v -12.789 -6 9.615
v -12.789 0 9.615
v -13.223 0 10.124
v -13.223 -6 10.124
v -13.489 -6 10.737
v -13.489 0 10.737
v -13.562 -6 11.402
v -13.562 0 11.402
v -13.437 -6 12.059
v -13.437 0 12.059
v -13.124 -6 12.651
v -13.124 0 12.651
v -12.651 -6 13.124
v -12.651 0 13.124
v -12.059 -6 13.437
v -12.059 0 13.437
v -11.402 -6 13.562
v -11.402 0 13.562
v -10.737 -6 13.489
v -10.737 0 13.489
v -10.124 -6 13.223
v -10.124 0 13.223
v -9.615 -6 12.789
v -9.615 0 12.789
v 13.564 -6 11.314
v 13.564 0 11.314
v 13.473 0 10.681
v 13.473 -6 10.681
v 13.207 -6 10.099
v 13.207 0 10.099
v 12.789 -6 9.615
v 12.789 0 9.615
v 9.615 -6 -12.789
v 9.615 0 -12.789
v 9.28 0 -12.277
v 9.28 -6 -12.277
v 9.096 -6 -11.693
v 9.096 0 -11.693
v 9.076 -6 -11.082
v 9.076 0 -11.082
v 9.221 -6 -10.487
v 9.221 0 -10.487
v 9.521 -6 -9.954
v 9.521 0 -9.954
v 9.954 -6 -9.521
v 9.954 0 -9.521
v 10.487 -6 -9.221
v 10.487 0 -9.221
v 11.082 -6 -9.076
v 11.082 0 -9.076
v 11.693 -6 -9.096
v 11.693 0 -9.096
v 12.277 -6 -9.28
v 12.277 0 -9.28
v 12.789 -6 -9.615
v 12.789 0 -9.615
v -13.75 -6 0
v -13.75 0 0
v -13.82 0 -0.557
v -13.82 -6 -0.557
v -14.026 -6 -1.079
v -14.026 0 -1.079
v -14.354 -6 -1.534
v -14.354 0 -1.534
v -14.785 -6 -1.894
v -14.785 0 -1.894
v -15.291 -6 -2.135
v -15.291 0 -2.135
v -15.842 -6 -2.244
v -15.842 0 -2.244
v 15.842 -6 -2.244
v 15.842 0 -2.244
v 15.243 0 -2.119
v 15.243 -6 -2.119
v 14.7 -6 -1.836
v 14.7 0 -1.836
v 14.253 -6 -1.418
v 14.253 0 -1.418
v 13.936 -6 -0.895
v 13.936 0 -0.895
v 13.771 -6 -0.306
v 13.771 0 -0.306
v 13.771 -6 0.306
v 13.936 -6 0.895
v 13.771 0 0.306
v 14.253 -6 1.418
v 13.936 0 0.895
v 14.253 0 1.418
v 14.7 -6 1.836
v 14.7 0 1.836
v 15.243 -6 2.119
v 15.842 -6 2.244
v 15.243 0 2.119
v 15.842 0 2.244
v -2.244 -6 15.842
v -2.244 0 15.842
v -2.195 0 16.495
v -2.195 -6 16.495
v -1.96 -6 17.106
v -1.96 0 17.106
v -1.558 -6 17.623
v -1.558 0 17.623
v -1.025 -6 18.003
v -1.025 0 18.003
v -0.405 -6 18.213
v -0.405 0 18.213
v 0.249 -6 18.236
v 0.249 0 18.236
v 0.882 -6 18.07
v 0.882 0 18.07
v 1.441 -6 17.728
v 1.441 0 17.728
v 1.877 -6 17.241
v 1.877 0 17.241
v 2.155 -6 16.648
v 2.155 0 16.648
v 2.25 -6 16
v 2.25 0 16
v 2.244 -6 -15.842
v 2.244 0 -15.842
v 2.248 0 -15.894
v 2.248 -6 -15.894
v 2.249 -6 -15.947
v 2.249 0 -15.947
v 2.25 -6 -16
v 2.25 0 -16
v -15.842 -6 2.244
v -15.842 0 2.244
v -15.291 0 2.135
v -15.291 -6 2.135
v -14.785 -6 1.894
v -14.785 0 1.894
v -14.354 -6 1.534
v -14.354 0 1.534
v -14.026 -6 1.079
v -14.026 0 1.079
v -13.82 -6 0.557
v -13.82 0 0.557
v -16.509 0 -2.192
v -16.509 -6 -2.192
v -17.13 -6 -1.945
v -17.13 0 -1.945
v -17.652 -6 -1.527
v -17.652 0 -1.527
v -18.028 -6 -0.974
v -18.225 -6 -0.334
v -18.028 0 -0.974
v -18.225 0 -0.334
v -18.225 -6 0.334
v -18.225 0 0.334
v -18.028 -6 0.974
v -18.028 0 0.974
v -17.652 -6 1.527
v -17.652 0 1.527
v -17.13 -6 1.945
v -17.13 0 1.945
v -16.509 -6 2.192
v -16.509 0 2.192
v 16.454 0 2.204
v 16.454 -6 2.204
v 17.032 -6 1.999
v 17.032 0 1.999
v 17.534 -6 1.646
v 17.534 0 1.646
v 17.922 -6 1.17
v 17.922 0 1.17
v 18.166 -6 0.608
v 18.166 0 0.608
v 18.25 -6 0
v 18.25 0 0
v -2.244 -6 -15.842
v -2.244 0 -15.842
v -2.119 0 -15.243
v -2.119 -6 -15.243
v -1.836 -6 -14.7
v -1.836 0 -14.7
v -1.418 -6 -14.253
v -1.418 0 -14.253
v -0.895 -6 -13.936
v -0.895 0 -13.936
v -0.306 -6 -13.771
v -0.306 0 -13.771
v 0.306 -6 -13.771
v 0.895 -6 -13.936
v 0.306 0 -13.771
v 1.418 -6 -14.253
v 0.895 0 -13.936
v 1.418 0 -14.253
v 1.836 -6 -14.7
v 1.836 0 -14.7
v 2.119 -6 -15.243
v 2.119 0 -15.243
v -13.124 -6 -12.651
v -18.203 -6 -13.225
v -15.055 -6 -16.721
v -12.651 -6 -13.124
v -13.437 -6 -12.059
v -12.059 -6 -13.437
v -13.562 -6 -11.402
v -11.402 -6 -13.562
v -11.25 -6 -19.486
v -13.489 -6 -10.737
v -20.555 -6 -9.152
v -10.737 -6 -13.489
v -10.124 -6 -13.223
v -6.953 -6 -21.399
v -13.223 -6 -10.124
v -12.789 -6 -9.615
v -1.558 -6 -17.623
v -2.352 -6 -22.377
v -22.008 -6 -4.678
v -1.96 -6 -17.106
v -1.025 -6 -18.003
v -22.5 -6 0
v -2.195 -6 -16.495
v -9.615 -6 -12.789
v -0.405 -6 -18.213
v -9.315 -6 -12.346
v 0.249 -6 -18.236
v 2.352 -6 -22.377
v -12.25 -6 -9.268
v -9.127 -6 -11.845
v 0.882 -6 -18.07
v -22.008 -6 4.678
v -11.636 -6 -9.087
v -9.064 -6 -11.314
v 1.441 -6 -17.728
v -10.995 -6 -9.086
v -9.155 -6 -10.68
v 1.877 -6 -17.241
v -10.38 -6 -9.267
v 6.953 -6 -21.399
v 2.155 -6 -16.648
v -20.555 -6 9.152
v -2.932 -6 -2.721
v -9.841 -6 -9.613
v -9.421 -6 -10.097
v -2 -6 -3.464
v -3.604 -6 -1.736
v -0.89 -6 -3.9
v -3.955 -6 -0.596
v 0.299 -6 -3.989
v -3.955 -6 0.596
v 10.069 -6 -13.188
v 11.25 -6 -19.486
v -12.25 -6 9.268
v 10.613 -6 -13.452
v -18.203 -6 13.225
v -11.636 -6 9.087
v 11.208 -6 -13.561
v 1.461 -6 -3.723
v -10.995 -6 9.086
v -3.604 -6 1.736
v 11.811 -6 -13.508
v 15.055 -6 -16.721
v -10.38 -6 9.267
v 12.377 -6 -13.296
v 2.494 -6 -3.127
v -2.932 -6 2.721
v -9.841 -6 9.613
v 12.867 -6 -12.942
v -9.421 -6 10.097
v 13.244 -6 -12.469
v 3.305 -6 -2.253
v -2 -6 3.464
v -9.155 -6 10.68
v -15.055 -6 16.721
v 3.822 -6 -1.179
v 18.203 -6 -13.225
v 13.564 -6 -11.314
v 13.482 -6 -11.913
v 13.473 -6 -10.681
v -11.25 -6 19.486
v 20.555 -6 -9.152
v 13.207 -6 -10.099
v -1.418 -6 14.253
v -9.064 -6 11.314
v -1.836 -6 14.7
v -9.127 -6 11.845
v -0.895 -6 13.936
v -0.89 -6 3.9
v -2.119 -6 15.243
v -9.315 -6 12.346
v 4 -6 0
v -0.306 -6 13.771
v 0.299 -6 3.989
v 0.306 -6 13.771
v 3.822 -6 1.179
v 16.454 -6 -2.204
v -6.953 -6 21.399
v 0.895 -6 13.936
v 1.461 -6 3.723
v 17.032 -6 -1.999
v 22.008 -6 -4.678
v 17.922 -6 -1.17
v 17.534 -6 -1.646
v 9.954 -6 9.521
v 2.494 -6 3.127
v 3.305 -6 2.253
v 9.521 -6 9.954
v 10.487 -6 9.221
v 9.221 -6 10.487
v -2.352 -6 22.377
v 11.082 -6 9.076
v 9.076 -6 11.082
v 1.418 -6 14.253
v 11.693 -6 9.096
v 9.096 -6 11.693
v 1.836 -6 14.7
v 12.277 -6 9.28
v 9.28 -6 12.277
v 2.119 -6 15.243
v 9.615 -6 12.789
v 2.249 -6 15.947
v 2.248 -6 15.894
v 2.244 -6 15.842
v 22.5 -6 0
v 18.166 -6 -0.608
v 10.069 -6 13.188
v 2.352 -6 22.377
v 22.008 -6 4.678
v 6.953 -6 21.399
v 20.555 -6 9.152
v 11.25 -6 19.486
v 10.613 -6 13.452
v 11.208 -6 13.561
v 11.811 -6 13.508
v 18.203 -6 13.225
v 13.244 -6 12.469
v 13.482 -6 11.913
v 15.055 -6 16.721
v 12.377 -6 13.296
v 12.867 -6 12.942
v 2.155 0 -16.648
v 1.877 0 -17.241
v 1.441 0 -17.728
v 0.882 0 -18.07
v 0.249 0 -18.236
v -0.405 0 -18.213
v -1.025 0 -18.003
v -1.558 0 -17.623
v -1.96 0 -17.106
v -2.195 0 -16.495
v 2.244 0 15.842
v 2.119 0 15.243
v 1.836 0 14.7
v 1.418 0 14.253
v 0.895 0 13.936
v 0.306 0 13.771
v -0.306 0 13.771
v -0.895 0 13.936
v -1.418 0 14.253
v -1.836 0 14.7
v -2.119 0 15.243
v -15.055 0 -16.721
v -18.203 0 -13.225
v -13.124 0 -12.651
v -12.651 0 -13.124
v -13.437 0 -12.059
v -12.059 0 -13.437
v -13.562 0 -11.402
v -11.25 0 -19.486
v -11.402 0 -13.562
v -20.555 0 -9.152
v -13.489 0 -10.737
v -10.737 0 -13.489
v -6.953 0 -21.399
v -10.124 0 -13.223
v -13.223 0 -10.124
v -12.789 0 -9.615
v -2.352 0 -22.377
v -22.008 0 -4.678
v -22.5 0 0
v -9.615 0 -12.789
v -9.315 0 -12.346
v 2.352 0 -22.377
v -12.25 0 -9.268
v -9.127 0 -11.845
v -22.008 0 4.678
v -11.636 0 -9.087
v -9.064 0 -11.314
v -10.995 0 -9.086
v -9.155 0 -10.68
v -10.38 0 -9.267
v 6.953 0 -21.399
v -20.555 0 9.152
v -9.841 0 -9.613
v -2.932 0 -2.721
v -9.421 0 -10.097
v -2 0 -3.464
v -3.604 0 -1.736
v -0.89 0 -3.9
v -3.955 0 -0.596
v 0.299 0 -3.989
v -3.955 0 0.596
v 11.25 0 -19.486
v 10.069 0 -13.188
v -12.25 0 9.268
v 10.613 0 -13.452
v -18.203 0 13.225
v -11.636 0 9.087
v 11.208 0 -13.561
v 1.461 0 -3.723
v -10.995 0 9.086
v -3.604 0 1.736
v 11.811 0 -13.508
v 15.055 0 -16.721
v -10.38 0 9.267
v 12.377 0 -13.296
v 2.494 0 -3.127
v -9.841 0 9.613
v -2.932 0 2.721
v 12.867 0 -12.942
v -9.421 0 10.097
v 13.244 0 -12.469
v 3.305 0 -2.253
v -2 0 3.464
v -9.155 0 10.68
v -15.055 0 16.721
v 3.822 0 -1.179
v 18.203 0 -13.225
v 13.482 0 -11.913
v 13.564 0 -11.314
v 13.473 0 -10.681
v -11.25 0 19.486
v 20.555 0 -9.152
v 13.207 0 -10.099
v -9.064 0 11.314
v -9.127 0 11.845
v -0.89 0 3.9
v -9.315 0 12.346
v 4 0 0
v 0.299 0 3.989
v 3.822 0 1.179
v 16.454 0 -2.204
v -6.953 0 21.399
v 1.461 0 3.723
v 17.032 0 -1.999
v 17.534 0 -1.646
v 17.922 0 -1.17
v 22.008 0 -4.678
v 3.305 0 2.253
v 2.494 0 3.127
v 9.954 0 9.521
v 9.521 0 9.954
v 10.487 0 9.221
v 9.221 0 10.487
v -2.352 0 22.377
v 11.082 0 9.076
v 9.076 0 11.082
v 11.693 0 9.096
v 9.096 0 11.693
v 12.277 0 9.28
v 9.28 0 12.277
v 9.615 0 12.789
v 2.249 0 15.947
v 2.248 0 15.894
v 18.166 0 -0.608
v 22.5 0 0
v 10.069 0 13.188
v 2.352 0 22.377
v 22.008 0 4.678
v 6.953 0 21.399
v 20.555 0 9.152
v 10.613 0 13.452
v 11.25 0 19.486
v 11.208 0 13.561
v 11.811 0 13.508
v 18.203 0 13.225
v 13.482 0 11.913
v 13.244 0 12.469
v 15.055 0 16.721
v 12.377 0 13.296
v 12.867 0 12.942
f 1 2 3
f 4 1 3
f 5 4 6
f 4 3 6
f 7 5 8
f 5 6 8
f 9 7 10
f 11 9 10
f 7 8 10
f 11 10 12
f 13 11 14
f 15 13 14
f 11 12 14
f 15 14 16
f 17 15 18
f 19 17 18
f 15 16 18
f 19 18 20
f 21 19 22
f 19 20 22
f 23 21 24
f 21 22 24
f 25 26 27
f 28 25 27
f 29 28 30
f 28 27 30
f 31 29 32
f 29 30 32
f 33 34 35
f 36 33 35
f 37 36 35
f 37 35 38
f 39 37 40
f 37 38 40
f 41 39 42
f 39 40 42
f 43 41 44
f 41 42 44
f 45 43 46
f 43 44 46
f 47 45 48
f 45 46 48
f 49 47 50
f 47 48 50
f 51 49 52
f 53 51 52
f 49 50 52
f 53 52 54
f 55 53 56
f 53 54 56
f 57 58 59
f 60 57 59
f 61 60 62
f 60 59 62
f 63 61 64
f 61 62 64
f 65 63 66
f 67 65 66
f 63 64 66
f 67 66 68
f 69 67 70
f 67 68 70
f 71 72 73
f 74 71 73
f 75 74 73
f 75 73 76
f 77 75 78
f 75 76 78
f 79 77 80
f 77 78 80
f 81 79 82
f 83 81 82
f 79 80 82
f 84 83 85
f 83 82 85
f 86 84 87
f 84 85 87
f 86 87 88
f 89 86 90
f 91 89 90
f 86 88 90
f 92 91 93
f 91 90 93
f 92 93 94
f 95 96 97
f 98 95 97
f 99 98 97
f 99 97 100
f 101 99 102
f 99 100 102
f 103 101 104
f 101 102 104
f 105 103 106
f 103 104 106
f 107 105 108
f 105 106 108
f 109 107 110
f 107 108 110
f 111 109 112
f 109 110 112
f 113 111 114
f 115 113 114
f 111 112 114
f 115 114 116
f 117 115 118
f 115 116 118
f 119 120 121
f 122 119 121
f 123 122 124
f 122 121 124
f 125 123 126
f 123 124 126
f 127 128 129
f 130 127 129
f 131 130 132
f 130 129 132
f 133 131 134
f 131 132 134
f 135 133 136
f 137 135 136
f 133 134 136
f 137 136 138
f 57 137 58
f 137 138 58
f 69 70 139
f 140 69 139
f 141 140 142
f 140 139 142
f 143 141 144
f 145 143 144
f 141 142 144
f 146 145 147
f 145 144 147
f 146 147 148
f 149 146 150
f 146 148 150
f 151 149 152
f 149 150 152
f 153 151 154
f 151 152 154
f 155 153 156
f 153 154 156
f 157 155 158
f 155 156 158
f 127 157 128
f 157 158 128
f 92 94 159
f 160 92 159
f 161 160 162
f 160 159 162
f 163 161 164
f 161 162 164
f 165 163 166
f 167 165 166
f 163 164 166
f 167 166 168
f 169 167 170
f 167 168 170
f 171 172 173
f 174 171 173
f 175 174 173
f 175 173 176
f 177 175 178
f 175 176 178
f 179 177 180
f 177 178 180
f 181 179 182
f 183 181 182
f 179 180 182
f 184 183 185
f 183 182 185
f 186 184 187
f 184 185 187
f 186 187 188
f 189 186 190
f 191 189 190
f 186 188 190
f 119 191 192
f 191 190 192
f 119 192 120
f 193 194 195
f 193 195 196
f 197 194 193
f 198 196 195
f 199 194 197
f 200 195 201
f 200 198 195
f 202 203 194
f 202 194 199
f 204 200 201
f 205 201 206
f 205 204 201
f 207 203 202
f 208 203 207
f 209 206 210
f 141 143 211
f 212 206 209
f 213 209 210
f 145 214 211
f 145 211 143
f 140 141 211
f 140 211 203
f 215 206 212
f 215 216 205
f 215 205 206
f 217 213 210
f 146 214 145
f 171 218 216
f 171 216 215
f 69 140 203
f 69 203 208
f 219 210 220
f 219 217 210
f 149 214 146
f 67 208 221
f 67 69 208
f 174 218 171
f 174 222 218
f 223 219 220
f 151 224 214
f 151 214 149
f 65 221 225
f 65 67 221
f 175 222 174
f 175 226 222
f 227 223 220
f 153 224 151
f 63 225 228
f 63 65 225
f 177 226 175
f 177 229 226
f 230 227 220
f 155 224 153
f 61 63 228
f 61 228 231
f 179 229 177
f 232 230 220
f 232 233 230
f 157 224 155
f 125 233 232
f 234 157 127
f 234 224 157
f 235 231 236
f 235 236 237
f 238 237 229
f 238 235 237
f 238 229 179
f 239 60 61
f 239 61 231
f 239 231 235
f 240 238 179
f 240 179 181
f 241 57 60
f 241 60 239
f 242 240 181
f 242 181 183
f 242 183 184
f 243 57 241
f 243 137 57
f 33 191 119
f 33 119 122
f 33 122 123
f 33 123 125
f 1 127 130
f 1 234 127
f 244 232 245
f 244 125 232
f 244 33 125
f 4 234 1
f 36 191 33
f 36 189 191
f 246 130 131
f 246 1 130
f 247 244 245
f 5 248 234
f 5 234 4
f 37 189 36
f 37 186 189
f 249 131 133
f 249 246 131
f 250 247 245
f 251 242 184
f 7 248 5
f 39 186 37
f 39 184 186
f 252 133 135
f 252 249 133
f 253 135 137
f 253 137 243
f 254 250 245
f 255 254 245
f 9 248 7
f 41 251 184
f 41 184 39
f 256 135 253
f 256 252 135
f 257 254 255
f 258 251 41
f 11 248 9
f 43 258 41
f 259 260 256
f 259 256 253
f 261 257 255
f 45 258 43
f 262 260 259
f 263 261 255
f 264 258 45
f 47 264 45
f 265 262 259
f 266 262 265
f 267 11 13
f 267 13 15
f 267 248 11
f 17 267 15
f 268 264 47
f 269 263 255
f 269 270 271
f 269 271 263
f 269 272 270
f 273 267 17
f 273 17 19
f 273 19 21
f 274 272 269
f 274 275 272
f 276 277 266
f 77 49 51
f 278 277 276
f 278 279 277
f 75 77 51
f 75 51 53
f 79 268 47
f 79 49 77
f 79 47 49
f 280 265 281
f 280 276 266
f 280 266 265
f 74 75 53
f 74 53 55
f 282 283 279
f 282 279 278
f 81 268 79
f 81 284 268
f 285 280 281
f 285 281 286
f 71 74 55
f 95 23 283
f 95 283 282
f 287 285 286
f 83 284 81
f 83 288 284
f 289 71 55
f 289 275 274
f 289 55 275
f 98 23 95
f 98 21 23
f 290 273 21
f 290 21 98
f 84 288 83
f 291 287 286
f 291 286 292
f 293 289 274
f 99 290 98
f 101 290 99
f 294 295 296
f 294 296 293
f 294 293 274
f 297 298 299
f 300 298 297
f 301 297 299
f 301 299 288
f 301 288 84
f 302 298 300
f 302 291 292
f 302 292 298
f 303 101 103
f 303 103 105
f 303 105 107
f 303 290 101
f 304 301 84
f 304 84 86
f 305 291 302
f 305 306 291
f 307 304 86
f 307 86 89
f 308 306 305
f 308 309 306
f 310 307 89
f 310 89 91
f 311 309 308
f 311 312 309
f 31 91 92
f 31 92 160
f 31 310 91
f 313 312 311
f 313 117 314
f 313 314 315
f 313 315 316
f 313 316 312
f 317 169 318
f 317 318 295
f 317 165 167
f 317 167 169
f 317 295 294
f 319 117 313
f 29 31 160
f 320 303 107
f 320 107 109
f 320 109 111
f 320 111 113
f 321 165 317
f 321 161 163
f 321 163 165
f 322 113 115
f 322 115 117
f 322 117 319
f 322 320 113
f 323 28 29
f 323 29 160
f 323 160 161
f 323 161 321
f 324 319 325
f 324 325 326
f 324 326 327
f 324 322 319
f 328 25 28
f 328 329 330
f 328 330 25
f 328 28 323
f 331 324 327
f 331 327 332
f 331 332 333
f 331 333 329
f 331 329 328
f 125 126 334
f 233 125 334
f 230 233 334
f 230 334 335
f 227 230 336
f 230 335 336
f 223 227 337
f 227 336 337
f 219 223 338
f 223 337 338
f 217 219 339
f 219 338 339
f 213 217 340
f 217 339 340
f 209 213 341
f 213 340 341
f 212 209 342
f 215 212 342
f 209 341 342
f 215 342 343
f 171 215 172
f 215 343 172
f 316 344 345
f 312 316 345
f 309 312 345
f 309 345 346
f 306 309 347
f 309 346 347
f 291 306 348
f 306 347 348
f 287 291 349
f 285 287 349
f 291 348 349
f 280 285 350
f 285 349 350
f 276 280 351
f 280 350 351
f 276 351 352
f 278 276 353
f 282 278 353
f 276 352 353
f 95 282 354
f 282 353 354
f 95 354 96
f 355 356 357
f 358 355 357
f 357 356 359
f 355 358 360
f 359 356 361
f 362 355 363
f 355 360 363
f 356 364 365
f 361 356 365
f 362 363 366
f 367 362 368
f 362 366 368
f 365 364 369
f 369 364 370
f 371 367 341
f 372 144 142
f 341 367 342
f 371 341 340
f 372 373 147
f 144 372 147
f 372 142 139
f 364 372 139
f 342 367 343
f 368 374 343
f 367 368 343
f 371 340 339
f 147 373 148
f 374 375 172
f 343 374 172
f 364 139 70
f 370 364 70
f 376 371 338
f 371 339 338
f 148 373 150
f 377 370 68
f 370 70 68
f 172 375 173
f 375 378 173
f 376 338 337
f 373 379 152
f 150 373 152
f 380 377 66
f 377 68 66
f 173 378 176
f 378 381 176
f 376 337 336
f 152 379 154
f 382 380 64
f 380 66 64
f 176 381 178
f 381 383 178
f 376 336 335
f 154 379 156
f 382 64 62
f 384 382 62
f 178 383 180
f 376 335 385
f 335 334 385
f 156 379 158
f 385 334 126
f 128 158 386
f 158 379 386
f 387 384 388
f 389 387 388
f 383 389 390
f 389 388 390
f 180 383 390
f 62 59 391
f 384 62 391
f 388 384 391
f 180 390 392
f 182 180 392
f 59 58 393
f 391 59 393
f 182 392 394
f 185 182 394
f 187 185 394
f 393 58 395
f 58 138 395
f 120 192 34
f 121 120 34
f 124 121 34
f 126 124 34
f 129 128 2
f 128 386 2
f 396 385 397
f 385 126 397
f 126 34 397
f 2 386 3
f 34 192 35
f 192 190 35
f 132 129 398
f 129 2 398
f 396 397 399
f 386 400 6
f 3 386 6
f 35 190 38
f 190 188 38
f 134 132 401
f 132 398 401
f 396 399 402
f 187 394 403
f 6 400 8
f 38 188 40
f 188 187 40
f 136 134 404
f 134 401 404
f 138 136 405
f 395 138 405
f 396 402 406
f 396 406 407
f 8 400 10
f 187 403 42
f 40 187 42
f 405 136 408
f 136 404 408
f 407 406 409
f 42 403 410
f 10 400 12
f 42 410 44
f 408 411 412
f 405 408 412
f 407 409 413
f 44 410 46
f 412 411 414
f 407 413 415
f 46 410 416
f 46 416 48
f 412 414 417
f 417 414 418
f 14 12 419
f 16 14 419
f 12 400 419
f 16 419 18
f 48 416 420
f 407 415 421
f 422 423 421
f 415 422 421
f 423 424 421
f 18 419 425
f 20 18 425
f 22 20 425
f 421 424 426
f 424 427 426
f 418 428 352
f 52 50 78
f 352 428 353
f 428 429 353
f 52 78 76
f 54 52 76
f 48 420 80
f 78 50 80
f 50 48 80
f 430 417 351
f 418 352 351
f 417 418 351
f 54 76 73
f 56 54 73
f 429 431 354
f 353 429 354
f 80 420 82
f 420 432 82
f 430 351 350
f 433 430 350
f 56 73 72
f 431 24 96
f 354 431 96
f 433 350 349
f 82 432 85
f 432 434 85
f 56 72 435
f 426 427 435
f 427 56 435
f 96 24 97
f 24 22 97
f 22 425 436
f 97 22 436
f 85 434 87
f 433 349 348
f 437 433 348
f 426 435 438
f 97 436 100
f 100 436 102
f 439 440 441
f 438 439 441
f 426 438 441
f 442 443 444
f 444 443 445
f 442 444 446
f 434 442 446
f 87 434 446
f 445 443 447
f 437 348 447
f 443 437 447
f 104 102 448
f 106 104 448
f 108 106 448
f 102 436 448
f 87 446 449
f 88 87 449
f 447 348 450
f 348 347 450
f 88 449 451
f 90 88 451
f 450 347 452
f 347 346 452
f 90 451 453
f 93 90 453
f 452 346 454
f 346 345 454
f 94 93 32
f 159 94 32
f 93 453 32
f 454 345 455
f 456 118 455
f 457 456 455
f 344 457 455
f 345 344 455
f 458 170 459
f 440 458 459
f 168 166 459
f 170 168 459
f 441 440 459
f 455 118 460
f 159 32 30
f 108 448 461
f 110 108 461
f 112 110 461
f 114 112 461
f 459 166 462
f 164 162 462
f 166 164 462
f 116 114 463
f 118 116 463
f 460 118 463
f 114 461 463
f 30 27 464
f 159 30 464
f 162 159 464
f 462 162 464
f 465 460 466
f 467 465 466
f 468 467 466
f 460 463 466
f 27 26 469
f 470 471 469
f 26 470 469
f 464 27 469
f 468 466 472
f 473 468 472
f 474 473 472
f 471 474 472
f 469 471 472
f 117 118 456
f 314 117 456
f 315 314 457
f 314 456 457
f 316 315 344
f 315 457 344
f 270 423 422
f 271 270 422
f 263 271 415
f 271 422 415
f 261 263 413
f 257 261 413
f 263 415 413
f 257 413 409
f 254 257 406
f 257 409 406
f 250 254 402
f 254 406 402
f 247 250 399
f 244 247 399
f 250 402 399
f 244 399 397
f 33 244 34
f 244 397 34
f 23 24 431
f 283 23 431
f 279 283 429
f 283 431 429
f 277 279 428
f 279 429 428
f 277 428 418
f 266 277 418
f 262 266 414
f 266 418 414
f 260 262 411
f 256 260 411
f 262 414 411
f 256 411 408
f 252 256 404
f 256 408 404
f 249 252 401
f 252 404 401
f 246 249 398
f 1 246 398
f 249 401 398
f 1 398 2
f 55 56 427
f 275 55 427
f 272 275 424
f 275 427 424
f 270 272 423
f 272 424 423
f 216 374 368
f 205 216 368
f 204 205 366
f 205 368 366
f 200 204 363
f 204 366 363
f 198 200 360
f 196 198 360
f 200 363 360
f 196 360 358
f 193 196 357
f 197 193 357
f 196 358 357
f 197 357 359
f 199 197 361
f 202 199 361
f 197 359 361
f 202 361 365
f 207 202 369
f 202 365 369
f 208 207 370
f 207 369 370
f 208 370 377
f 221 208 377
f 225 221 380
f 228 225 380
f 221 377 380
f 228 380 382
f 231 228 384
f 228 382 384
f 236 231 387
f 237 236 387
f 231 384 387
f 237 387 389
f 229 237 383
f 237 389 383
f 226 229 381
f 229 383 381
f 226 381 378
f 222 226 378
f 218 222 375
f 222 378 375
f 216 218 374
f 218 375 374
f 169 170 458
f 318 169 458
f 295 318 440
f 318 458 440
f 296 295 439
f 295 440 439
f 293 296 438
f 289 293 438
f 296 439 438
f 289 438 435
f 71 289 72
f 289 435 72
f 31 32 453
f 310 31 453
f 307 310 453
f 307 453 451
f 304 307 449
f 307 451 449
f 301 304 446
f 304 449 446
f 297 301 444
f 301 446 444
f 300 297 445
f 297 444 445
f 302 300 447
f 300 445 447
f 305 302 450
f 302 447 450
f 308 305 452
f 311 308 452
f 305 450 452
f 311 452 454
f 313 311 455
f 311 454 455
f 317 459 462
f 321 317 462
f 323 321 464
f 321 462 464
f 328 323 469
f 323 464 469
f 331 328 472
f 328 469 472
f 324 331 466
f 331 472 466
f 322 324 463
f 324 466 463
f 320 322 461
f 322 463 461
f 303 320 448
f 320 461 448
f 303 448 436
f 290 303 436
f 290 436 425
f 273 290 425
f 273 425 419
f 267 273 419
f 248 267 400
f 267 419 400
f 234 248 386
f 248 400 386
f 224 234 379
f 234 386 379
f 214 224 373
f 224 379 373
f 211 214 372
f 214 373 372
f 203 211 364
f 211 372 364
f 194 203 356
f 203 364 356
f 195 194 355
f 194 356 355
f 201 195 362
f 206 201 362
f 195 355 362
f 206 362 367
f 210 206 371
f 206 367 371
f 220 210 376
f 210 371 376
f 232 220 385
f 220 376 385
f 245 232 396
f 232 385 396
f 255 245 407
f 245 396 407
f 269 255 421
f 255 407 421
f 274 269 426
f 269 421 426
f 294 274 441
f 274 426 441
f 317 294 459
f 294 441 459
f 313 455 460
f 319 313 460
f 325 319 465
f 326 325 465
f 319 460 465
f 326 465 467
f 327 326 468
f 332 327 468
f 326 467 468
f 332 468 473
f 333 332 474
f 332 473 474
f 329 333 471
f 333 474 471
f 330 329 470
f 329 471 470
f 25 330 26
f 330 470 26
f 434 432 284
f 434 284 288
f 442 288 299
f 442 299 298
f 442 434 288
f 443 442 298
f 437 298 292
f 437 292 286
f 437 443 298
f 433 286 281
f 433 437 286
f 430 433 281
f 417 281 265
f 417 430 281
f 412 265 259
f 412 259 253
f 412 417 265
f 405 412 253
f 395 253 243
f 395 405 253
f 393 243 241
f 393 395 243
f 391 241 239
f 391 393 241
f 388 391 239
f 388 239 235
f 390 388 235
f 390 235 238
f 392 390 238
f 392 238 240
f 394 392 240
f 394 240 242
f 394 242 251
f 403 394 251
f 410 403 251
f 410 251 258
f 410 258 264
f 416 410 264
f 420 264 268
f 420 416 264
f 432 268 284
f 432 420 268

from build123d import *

# Parameters (mm, degrees)
F0_R     = 22.5
F0_R_2   = 4
F1_DEPTH = 6


with BuildPart() as f1:
    # F0 (on Front) → F1 (new body)
    with BuildSketch(Plane.XZ):
        Circle(F0_R)
        with BuildLine():
            ThreePointArc((12.788895, 9.614789), (14.782073, 6.122935), (15.841797, 2.244431))
            ThreePointArc((15.841797, 2.244431), (17.534038, 1.645973), (18.25, 0))
            ThreePointArc((18.25, 0), (17.534038, -1.645973), (15.841797, -2.244431))
            ThreePointArc((15.841797, -2.244431), (14.782073, -6.122935), (12.788895, -9.614789))
            ThreePointArc((12.788895, -9.614789), (13.360861, -10.380078), (13.563708, -11.313708))
            ThreePointArc((13.563708, -11.313708), (12.101088, -13.42144), (9.614789, -12.788895))
            ThreePointArc((9.614789, -12.788895), (6.122935, -14.782073), (2.244431, -15.841797))
            ThreePointArc((2.244431, -15.841797), (2.248607, -15.920849), (2.25, -16))
            ThreePointArc((2.25, -16), (-0.079151, -18.248607), (-2.244431, -15.841797))
            ThreePointArc((-2.244431, -15.841797), (-6.122935, -14.782073), (-9.614789, -12.788895))
            ThreePointArc((-9.614789, -12.788895), (-12.904699, -12.904699), (-12.788895, -9.614789))
            ThreePointArc((-12.788895, -9.614789), (-14.782073, -6.122935), (-15.841797, -2.244431))
            ThreePointArc((-15.841797, -2.244431), (-18.25, 0), (-15.841797, 2.244431))
            ThreePointArc((-15.841797, 2.244431), (-14.782073, 6.122935), (-12.788895, 9.614789))
            ThreePointArc((-12.788895, 9.614789), (-12.904699, 12.904699), (-9.614789, 12.788895))
            ThreePointArc((-9.614789, 12.788895), (-6.122935, 14.782073), (-2.244431, 15.841797))
            ThreePointArc((-2.244431, 15.841797), (-0.079151, 18.248607), (2.25, 16))
            ThreePointArc((2.25, 16), (2.248607, 15.920849), (2.244431, 15.841797))
            ThreePointArc((2.244431, 15.841797), (6.122935, 14.782073), (9.614789, 12.788895))
            ThreePointArc((9.614789, 12.788895), (12.101088, 13.42144), (13.563708, 11.313708))
            ThreePointArc((13.563708, 11.313708), (13.360861, 10.380078), (12.788895, 9.614789))
        make_face(mode=Mode.SUBTRACT)
        with BuildLine():
            ThreePointArc((15.841797, -2.244431), (13.75, 0), (15.841797, 2.244431))
            ThreePointArc((15.841797, 2.244431), (14.782073, 6.122935), (12.788895, 9.614789))
            ThreePointArc((12.788895, 9.614789), (9.722718, 9.722718), (9.614789, 12.788895))
            ThreePointArc((9.614789, 12.788895), (6.122935, 14.782073), (2.244431, 15.841797))
            ThreePointArc((2.244431, 15.841797), (0, 13.75), (-2.244431, 15.841797))
            ThreePointArc((-2.244431, 15.841797), (-6.122935, 14.782073), (-9.614789, 12.788895))
            ThreePointArc((-9.614789, 12.788895), (-9.205977, 12.101088), (-9.063708, 11.313708))
            ThreePointArc((-9.063708, 11.313708), (-10.380078, 9.266556), (-12.788895, 9.614789))
            ThreePointArc((-12.788895, 9.614789), (-14.782073, 6.122935), (-15.841797, 2.244431))
            ThreePointArc((-15.841797, 2.244431), (-14.354027, 1.534038), (-13.75, 0))
            ThreePointArc((-13.75, 0), (-14.354027, -1.534038), (-15.841797, -2.244431))
            ThreePointArc((-15.841797, -2.244431), (-14.782073, -6.122935), (-12.788895, -9.614789))
            ThreePointArc((-12.788895, -9.614789), (-10.380078, -9.266556), (-9.063708, -11.313708))
            ThreePointArc((-9.063708, -11.313708), (-9.205977, -12.101088), (-9.614789, -12.788895))
            ThreePointArc((-9.614789, -12.788895), (-6.122935, -14.782073), (-2.244431, -15.841797))
            ThreePointArc((-2.244431, -15.841797), (0, -13.75), (2.244431, -15.841797))
            ThreePointArc((2.244431, -15.841797), (6.122935, -14.782073), (9.614789, -12.788895))
            ThreePointArc((9.614789, -12.788895), (9.722718, -9.722718), (12.788895, -9.614789))
            ThreePointArc((12.788895, -9.614789), (14.782073, -6.122935), (15.841797, -2.244431))
        make_face()
        Circle(F0_R_2, mode=Mode.SUBTRACT)
    extrude(amount=F1_DEPTH)


solid = f1.part
